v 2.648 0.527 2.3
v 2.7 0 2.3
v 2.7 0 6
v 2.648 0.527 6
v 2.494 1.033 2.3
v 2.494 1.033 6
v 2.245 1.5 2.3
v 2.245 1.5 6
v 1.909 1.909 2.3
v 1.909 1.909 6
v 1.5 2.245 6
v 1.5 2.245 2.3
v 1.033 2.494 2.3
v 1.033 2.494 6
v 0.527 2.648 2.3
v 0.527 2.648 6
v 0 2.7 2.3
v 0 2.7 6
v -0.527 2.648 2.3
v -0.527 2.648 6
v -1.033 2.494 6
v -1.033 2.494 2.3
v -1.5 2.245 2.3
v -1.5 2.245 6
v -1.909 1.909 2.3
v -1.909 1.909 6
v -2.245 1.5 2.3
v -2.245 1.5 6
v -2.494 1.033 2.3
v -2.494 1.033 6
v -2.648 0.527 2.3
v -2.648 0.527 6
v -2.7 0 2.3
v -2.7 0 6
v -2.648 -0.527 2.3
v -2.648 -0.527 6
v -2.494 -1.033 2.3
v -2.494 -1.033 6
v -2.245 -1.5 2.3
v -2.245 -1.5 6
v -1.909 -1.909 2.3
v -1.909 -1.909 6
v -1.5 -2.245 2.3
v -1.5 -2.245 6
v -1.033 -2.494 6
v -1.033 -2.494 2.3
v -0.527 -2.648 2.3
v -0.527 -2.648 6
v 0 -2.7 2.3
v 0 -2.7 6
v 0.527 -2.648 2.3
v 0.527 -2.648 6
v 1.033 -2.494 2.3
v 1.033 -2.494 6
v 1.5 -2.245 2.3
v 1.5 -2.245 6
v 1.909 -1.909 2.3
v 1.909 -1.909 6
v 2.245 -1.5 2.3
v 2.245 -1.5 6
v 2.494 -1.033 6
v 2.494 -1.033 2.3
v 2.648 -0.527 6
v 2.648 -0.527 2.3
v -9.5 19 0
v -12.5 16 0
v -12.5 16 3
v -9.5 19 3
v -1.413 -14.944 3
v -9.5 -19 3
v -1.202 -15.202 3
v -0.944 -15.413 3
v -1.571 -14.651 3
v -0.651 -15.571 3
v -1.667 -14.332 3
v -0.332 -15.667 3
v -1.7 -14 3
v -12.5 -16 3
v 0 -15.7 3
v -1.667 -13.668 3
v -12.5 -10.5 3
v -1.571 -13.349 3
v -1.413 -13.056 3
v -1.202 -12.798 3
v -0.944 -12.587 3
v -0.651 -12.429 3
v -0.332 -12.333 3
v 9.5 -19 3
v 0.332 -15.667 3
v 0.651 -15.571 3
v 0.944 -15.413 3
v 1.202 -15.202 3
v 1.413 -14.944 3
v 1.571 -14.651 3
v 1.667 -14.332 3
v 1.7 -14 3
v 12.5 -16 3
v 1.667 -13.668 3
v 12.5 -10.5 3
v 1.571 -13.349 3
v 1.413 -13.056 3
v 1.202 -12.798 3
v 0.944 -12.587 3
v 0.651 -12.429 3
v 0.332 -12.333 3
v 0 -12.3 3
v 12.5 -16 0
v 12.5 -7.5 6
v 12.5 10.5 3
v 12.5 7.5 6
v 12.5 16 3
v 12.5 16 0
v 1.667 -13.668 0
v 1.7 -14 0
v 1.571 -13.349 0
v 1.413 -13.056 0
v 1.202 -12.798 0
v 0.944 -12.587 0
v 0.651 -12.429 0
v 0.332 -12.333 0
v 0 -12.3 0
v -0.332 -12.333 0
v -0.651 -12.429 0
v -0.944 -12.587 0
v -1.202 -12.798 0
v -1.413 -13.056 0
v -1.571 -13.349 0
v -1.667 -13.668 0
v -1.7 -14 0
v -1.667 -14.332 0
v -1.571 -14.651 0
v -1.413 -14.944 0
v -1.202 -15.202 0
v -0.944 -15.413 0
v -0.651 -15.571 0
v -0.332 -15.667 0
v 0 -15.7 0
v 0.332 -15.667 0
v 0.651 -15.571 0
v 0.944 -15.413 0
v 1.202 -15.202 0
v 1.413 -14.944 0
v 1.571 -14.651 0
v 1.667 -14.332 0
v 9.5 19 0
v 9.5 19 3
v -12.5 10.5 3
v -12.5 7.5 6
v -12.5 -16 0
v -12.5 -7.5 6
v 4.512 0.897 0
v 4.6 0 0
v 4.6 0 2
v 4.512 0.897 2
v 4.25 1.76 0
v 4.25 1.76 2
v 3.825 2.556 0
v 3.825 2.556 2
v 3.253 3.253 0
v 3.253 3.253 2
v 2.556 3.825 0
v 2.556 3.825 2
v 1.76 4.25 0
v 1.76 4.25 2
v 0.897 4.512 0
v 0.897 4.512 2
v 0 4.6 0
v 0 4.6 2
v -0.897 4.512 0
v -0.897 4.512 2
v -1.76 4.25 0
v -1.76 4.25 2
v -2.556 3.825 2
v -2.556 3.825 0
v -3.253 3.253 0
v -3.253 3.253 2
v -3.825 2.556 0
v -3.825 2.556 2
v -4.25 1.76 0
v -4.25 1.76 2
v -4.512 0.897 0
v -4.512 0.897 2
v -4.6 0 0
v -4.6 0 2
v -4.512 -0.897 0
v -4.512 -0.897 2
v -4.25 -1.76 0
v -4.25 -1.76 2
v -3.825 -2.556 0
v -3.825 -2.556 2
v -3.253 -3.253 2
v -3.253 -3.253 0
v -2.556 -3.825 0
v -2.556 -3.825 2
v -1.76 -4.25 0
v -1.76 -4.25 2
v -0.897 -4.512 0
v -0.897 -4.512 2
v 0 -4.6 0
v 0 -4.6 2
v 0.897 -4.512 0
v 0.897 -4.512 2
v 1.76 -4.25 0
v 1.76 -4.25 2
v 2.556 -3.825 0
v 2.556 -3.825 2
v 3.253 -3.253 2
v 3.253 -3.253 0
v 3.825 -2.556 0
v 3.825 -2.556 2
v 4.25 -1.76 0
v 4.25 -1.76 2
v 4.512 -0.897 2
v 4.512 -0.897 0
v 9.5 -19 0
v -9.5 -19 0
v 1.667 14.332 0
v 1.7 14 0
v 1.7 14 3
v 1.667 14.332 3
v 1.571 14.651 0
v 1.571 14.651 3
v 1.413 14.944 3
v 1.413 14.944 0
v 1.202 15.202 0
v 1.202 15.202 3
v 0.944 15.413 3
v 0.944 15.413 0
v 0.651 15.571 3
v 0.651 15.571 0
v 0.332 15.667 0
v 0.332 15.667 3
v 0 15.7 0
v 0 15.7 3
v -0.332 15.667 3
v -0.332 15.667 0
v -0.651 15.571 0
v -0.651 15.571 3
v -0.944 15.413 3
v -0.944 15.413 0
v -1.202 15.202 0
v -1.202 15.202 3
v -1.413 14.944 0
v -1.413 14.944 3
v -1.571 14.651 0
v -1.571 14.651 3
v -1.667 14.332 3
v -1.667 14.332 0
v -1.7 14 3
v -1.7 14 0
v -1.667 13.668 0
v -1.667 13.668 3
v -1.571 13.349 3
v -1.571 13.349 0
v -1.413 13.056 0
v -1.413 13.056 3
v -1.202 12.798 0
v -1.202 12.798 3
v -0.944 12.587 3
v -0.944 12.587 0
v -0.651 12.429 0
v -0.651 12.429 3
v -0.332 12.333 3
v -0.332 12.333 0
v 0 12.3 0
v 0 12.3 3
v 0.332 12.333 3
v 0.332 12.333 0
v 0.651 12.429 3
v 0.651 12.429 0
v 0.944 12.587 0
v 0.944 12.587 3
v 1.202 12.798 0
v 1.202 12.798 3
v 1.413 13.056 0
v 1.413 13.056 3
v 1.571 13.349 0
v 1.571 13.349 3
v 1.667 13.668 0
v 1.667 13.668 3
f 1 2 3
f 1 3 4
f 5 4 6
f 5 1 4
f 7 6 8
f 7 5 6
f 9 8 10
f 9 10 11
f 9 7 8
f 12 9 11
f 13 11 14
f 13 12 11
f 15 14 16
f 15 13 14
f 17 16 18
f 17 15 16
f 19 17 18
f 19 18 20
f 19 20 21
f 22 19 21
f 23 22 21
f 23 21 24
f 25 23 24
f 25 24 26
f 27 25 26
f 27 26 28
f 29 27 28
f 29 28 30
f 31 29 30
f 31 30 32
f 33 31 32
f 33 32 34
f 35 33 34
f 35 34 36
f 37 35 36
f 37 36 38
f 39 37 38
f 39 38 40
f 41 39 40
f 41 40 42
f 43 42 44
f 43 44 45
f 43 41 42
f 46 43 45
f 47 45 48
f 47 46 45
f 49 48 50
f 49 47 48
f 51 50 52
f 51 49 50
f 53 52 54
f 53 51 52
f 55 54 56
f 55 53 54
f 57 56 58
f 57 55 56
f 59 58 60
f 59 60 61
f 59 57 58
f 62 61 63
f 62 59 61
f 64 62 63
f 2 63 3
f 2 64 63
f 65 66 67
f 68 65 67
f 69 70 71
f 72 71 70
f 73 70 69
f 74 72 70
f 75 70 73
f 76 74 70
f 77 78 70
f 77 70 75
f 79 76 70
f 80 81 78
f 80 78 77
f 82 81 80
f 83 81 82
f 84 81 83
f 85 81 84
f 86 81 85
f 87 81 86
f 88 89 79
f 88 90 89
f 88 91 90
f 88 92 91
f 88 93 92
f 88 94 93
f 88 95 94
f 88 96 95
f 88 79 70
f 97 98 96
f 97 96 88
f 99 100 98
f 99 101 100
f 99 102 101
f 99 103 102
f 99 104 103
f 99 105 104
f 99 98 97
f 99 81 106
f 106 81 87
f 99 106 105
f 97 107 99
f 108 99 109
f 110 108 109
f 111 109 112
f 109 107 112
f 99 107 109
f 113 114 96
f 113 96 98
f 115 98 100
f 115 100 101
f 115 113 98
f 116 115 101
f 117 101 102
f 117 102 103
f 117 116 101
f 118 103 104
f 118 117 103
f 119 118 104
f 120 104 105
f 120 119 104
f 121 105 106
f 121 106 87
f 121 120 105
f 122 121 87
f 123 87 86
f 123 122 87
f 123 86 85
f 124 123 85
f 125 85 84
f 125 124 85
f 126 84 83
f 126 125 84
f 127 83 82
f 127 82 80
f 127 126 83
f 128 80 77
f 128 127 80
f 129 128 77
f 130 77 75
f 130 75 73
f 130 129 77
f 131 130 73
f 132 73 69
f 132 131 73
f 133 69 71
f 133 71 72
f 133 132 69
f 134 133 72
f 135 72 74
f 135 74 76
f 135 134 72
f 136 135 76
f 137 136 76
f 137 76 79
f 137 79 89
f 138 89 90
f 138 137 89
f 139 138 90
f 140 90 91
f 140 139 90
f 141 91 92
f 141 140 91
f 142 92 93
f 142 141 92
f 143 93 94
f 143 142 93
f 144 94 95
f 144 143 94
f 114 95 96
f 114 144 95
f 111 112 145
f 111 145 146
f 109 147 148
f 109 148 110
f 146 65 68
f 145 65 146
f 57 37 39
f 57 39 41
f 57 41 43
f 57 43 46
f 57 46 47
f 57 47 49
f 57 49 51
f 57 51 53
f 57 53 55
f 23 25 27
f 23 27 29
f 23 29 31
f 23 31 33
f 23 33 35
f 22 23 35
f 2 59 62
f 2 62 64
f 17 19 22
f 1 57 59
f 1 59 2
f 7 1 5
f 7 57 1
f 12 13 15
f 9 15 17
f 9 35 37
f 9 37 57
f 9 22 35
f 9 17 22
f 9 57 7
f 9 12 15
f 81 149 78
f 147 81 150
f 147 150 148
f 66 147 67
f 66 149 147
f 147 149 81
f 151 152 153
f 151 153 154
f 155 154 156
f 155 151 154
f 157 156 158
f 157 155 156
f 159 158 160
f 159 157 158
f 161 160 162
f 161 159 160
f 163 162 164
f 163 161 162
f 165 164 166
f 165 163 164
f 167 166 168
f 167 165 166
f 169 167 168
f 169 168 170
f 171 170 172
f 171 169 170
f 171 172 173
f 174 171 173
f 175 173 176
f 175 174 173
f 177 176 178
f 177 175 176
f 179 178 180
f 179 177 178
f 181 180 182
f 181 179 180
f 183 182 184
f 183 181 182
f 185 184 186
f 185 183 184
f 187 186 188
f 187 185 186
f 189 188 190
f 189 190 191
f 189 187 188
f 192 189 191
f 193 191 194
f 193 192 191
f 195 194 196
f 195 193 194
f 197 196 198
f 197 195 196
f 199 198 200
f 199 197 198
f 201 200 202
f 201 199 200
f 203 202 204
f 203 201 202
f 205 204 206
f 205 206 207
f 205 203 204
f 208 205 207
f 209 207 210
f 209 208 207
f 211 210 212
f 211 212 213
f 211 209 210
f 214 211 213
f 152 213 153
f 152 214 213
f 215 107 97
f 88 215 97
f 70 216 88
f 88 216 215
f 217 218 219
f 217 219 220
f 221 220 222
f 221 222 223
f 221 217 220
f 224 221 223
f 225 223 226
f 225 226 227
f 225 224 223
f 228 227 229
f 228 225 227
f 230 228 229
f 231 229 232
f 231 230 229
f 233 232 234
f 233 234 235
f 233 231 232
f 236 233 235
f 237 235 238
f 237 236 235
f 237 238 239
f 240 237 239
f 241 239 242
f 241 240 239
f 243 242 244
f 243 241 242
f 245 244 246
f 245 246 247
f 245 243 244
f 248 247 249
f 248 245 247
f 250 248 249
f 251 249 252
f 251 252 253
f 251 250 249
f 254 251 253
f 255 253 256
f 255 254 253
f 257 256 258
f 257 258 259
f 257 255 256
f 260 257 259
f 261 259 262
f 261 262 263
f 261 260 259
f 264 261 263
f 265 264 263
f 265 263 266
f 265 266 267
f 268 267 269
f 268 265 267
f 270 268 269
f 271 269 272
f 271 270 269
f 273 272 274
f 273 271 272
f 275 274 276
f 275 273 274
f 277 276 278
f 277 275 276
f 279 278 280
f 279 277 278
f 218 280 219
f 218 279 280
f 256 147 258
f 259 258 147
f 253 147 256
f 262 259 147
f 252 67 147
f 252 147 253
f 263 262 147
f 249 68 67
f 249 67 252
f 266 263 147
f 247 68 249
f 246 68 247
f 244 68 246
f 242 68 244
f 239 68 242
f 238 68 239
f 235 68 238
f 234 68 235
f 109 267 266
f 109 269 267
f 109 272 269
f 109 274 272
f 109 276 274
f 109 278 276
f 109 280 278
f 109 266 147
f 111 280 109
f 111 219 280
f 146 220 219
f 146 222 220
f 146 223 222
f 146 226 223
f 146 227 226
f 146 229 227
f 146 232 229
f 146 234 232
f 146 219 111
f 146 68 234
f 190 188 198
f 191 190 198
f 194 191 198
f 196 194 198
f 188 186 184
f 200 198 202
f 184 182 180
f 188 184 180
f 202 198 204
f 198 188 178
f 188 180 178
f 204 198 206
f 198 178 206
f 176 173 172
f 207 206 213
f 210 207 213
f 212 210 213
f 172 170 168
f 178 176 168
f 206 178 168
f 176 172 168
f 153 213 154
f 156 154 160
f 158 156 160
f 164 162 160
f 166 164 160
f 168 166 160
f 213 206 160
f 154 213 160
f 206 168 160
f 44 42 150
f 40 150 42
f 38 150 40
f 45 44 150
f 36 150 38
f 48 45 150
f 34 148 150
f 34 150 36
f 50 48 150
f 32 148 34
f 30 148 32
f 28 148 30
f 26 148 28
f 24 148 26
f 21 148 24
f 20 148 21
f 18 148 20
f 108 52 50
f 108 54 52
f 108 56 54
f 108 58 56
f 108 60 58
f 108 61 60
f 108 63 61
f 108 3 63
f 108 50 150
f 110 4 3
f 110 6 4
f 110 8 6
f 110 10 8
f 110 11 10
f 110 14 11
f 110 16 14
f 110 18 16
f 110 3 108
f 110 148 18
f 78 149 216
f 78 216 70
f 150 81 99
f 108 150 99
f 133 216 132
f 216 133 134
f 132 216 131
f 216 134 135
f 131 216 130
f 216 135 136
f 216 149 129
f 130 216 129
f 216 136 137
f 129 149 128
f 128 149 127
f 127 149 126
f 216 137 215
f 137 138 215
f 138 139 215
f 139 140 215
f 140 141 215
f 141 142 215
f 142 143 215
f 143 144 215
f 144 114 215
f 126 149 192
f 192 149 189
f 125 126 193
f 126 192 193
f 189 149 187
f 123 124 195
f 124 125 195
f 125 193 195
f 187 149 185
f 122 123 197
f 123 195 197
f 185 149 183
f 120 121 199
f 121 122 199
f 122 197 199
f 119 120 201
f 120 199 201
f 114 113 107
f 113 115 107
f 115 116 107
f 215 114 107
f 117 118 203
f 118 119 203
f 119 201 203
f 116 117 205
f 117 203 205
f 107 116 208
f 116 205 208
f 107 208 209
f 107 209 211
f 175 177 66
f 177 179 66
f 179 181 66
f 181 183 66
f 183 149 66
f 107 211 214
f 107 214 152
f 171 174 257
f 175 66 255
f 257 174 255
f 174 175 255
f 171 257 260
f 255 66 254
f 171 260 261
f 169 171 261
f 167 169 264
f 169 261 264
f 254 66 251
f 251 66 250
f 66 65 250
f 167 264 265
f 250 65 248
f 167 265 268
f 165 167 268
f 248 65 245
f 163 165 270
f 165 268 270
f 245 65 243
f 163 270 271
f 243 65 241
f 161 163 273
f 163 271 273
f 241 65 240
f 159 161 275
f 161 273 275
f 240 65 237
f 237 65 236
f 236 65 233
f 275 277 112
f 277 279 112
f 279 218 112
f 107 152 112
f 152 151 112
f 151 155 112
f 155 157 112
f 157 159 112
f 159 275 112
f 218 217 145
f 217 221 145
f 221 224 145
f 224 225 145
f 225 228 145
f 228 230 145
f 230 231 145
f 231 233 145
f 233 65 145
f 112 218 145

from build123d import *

# Parameters (mm, degrees)
F0_W     = 25
F0_H     = 11.5
F0_R     = 1.7
F1_DEPTH = 3
F0_H_2   = 15
F0_R_2   = 4.6
F0_R_3   = 2.7
F2_DEPTH = 6
F3_DEPTH = 2
F4_SIZE  = 2.99999
F5_START = 2
F5_DEPTH = 0.3


# Not quite as in the source:
# - a fillet or chamfer is up to 0.001 mm smaller than in the source, because OpenCascade refuses the exact size


with BuildPart() as f1:
    # F0 (on Top) → F1 (new body)
    with BuildSketch(Plane.XY):
        with Locations((0, 13.25)):
            Rectangle(F0_W, F0_H)
        with Locations((0, 14)):
            Circle(F0_R, mode=Mode.SUBTRACT)
    extrude(amount=F1_DEPTH)



with BuildPart() as f1b:
    # F0 (on Top) → F1, piece 2 (new body)
    with BuildSketch(Plane.XY):
        with Locations((0, -13.25)):
            Rectangle(F0_W, F0_H)
        with Locations((0, -14)):
            Circle(F0_R, mode=Mode.SUBTRACT)
    extrude(amount=F1_DEPTH)


with BuildPart() as f1_1:
    add(f1.part)

    add(f1b.part)  # F2 merges F1b
    # F0 (on Top) → F2 (join)
    with BuildSketch(Plane.XY):
        Rectangle(F0_W, F0_H_2)
        Circle(F0_R_2, mode=Mode.SUBTRACT)
        Circle(F0_R_2)
        Circle(F0_R_3, mode=Mode.SUBTRACT)
    extrude(amount=F2_DEPTH)

    # F0 (on Top) → F3 (cut)
    with BuildSketch(Plane.XY):
        Circle(F0_R_2)
        Circle(F0_R_3, mode=Mode.SUBTRACT)
    extrude(amount=F3_DEPTH, mode=Mode.SUBTRACT)

    # F4 (size 3 in the source; OpenCascade refuses exactly that, so slightly less here)
    f4_edges = [f1_1.edges().sort_by_distance(p)[0] for p in [
        (0, 7.5, 3),
        (0, -7.5, 3),
        (12.5, -19, 1.5),
        (-12.5, -19, 1.5),
        (12.5, 19, 1.5),
        (-12.5, 19, 1.5),
    ]]
    chamfer(f4_edges, length=F4_SIZE)

    # F0 (on Top) → F5 (join)
    with BuildSketch(Plane.XY.offset(F5_START)):
        Circle(F0_R_3)
    extrude(amount=F5_DEPTH)


solid = f1_1.part
